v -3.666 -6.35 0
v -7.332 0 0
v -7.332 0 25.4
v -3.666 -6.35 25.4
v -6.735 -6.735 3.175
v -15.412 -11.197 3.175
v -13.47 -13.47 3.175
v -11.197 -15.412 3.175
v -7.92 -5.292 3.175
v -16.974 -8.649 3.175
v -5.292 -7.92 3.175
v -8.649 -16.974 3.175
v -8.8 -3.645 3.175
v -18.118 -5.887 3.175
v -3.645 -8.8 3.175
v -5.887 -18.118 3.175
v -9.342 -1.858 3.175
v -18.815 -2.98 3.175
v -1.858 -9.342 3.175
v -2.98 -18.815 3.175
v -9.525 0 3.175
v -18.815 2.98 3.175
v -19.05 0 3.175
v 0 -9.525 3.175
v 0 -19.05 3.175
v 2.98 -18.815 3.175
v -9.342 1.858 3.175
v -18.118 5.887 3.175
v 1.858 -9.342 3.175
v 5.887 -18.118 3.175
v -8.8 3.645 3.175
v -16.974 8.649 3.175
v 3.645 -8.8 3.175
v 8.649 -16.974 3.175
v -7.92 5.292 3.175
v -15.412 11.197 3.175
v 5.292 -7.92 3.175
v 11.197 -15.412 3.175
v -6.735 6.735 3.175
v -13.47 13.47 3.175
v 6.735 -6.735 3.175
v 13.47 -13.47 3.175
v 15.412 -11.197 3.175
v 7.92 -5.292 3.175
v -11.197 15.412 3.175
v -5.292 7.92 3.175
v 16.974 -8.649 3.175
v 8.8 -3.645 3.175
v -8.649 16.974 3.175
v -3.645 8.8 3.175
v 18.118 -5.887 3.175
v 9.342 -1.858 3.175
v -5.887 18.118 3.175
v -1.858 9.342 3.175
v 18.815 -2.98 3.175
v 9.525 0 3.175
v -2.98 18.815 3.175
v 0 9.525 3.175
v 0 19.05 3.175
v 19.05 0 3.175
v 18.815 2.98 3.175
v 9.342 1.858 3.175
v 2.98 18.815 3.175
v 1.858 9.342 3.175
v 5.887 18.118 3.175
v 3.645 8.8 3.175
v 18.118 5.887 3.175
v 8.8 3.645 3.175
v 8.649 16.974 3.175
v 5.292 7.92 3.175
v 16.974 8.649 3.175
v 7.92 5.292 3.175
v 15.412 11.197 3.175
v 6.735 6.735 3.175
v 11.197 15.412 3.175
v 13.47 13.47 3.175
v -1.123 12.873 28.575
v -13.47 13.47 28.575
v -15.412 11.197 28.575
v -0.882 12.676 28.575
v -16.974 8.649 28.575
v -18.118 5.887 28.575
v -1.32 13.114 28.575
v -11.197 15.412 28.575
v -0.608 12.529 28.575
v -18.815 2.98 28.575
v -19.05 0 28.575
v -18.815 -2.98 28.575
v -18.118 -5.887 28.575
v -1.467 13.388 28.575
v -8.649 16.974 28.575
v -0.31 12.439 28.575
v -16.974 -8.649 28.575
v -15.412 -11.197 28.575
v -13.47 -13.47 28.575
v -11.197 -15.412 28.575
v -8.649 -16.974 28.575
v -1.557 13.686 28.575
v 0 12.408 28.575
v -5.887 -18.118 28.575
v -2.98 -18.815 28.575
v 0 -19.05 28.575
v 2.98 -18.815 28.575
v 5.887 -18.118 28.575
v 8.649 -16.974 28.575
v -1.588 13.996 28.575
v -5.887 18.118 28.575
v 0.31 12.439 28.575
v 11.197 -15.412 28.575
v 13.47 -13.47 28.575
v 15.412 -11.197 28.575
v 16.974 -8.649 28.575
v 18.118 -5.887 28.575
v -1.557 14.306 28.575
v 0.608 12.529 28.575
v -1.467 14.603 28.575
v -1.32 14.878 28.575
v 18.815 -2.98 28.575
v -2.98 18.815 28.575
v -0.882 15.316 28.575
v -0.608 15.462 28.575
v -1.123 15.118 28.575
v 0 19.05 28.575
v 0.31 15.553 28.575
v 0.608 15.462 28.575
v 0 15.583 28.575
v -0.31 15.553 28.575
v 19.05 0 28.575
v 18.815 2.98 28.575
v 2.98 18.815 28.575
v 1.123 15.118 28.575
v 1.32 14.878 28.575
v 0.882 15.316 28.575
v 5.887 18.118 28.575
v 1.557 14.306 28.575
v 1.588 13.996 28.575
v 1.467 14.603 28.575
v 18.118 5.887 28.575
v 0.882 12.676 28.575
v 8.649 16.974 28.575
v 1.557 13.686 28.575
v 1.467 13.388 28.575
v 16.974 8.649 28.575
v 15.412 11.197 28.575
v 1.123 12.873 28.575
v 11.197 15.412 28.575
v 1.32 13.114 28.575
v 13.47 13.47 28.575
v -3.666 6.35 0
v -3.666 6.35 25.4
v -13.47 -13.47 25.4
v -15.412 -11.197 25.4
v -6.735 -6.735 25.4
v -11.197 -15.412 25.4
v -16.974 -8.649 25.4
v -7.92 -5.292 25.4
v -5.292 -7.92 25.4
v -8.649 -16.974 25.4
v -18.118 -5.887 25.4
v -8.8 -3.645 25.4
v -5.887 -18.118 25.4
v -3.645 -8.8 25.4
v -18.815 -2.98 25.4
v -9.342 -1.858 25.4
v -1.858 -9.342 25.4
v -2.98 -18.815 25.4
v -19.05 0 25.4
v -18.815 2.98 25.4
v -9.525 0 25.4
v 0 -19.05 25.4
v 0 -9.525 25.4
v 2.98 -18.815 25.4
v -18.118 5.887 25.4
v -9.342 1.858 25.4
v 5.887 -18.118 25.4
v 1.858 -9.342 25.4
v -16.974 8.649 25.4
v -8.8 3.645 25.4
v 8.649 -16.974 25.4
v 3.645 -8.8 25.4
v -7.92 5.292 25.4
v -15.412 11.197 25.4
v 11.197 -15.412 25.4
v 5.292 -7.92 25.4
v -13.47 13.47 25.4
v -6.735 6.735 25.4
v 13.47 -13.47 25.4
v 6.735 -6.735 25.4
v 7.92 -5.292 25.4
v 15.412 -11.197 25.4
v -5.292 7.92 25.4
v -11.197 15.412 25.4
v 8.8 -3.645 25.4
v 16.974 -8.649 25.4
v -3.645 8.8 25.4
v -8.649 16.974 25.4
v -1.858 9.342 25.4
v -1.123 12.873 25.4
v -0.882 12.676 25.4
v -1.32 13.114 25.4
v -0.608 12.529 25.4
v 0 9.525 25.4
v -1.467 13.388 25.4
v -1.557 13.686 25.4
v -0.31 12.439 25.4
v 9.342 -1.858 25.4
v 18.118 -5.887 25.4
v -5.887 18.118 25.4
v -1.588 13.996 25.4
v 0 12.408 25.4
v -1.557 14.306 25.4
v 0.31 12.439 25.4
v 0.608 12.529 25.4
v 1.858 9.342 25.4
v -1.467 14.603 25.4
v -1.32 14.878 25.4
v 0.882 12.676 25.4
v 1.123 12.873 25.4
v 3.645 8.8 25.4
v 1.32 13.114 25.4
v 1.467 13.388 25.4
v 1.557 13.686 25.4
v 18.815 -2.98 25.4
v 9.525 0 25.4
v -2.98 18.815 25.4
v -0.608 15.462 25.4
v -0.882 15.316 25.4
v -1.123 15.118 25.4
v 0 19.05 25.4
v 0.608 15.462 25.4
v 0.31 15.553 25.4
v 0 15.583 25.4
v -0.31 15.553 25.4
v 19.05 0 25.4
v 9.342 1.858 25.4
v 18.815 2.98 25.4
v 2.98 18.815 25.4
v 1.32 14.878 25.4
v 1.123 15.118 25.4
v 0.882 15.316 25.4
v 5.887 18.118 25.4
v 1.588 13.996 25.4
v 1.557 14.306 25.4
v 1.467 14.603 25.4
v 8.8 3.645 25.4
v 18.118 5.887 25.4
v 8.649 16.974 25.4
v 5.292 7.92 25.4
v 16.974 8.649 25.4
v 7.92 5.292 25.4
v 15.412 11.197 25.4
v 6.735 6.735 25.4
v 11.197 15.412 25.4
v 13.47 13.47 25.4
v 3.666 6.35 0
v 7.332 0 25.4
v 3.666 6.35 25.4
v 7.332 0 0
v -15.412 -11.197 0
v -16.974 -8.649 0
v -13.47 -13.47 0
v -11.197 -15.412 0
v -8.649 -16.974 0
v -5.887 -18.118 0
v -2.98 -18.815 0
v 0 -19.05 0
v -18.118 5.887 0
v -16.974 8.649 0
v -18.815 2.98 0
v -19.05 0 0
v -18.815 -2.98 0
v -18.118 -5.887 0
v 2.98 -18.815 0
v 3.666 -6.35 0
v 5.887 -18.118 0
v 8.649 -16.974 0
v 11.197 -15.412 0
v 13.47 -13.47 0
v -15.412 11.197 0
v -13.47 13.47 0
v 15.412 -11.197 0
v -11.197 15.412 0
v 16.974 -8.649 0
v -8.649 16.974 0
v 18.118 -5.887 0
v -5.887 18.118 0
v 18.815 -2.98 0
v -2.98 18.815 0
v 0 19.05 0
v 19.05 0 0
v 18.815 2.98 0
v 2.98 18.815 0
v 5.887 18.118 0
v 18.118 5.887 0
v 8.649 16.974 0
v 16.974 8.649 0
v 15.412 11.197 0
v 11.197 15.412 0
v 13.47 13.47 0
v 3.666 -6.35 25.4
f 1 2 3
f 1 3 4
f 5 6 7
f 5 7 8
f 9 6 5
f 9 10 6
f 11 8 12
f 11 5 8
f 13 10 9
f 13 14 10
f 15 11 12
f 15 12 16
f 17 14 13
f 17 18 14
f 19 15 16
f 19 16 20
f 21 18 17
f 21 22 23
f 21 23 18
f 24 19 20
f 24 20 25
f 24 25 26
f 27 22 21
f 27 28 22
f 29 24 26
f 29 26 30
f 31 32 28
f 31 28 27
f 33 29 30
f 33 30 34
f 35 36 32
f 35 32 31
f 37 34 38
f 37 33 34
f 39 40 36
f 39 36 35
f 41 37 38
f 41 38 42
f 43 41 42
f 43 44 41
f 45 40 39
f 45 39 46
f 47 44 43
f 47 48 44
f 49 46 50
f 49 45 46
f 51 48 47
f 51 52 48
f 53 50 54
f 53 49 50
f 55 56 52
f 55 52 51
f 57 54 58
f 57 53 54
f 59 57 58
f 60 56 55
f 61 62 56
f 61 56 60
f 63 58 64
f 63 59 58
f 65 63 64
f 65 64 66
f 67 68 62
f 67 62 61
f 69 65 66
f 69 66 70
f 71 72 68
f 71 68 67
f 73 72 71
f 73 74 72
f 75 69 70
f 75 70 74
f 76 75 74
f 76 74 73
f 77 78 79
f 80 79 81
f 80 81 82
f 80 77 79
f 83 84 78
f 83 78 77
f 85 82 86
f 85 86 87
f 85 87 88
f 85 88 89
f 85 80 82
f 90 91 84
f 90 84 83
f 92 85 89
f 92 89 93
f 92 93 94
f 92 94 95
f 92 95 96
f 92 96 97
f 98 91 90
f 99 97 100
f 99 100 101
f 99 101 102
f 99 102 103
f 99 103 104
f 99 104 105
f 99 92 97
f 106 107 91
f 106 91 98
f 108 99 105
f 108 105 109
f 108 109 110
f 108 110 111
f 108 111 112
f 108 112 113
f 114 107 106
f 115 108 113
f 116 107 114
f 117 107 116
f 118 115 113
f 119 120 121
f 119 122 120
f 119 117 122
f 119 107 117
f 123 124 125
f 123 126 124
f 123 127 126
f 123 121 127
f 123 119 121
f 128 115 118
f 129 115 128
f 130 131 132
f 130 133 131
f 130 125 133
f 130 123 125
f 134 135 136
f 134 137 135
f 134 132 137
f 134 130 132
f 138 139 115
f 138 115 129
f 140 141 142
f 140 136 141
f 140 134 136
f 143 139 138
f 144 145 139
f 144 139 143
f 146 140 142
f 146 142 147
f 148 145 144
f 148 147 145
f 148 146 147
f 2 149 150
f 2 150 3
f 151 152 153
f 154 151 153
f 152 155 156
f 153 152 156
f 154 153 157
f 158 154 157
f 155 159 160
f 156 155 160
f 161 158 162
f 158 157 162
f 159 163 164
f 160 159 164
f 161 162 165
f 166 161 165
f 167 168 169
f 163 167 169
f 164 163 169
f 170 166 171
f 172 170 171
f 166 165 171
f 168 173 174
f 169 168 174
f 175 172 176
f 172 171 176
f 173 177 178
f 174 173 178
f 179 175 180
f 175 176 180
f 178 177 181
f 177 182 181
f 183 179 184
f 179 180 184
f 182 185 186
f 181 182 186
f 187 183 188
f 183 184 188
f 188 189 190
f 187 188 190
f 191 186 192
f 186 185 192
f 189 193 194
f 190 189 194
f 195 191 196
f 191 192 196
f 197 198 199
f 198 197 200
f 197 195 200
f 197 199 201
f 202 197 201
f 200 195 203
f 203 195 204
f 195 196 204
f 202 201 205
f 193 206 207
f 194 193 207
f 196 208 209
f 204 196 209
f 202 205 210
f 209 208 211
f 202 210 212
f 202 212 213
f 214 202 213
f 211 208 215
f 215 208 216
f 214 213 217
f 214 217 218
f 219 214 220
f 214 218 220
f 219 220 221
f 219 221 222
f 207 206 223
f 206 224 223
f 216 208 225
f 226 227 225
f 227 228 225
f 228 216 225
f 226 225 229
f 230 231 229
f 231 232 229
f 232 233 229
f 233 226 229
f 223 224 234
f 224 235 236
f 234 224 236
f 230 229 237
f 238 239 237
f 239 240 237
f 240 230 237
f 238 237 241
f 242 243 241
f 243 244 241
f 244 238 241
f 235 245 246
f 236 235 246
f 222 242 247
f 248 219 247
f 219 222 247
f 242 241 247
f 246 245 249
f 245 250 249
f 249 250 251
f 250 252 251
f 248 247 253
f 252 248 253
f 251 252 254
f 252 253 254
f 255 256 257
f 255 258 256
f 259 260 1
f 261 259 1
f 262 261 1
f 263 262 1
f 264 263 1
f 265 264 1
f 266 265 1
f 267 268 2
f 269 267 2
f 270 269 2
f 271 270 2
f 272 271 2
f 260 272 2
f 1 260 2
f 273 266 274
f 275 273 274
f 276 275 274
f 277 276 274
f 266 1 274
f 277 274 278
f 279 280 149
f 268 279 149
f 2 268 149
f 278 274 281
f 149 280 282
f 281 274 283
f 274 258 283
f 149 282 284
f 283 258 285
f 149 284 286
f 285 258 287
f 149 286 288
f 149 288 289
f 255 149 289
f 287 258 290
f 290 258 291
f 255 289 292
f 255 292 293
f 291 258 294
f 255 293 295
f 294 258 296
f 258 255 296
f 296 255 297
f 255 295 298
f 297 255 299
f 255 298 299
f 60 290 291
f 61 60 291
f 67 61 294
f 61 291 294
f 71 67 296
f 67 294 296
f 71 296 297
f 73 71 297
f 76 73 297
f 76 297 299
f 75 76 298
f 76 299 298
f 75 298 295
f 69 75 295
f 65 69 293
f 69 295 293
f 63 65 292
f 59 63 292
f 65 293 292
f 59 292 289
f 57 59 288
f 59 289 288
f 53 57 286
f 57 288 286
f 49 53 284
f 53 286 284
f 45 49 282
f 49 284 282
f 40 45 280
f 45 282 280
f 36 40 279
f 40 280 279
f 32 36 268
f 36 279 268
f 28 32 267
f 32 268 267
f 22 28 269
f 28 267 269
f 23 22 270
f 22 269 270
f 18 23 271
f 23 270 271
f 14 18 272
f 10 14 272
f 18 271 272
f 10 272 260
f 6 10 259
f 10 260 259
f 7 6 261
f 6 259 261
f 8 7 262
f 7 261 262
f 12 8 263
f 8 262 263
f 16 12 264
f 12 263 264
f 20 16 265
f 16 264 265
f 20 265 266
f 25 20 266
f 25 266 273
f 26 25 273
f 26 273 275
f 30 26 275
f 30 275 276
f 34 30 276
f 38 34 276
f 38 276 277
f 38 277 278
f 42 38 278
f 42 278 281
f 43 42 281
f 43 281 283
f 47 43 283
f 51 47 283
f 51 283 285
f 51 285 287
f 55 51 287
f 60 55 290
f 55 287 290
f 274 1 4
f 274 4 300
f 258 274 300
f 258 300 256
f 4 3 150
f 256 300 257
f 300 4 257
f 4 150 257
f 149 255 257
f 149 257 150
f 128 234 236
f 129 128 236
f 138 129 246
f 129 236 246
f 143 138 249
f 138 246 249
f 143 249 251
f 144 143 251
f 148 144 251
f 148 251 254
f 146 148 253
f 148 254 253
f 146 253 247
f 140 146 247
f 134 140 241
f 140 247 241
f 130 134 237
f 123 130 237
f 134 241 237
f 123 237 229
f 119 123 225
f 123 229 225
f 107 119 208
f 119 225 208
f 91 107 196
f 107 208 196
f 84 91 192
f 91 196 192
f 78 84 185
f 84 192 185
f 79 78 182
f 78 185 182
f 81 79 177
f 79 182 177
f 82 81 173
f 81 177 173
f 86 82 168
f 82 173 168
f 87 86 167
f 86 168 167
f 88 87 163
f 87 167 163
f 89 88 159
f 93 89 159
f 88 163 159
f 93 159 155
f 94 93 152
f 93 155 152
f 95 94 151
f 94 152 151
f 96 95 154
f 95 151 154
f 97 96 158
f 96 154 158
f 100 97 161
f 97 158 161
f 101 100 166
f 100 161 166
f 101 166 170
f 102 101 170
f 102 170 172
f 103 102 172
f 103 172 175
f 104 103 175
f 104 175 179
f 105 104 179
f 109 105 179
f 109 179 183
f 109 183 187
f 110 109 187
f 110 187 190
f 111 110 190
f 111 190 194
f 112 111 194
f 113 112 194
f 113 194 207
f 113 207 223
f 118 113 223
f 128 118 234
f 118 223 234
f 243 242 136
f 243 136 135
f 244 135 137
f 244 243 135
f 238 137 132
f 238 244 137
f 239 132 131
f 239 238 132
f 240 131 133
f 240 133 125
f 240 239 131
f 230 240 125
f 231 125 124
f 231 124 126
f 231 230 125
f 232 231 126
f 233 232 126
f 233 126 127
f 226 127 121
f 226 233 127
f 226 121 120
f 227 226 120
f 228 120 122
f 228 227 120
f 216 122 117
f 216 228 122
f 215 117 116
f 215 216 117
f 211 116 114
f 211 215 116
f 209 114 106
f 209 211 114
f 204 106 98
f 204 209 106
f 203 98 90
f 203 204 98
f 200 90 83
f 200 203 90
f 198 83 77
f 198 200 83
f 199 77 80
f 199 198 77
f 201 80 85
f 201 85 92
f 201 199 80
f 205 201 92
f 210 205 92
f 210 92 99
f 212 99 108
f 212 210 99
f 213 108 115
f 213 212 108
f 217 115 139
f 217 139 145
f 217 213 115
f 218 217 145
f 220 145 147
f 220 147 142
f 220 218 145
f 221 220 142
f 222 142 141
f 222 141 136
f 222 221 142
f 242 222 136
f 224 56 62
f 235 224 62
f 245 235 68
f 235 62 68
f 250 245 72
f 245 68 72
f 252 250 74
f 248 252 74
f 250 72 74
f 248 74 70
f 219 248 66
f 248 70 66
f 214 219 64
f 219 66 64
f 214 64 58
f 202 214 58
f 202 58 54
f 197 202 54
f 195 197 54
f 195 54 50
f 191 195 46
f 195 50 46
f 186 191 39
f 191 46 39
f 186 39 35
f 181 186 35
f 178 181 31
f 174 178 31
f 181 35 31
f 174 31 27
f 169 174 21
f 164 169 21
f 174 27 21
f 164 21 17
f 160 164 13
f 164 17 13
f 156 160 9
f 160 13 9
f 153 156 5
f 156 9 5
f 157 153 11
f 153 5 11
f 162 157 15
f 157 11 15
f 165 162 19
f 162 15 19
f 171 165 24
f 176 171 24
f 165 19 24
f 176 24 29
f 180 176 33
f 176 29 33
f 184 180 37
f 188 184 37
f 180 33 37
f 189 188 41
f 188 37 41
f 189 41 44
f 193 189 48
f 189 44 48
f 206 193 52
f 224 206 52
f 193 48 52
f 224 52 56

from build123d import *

# Parameters (mm, degrees)
SKETCH1_R           = 19.05
BOSS_EXTRUDE1_DEPTH = 3.175
SKETCH2_R           = 9.525
BOSS_EXTRUDE2_DEPTH = 22.225
SKETCH3_R           = 19.05
SKETCH3_R_2         = 1.5875
BOSS_EXTRUDE3_DEPTH = 3.175


with BuildPart() as part:
    # Sketch1 → Boss-Extrude1 (new body)
    with BuildSketch(Plane.XY):
        Circle(SKETCH1_R)
        Polygon((7.332348419, 0), (3.666174209, 6.35), (-3.666174209, 6.35), (-7.332348419, 0), (-3.666174209, -6.35), (3.666174209, -6.35), align=None, mode=Mode.SUBTRACT)
    extrude(amount=BOSS_EXTRUDE1_DEPTH)

    # Sketch2 → Boss-Extrude2 (add)
    with BuildSketch(Plane.XY.offset(3.175)):
        Circle(SKETCH2_R)
        Polygon((7.332348419, 0), (3.666174209, 6.35), (-3.666174209, 6.35), (-7.332348419, 0), (-3.666174209, -6.35), (3.666174209, -6.35), align=None, mode=Mode.SUBTRACT)
    extrude(amount=BOSS_EXTRUDE2_DEPTH)

    # Sketch3 → Boss-Extrude3 (add)
    with BuildSketch(Plane.XY.offset(25.4)):
        Circle(SKETCH3_R)
        with Locations((0, 13.995802971)):
            Circle(SKETCH3_R_2, mode=Mode.SUBTRACT)
    extrude(amount=BOSS_EXTRUDE3_DEPTH)


solid = part.part
